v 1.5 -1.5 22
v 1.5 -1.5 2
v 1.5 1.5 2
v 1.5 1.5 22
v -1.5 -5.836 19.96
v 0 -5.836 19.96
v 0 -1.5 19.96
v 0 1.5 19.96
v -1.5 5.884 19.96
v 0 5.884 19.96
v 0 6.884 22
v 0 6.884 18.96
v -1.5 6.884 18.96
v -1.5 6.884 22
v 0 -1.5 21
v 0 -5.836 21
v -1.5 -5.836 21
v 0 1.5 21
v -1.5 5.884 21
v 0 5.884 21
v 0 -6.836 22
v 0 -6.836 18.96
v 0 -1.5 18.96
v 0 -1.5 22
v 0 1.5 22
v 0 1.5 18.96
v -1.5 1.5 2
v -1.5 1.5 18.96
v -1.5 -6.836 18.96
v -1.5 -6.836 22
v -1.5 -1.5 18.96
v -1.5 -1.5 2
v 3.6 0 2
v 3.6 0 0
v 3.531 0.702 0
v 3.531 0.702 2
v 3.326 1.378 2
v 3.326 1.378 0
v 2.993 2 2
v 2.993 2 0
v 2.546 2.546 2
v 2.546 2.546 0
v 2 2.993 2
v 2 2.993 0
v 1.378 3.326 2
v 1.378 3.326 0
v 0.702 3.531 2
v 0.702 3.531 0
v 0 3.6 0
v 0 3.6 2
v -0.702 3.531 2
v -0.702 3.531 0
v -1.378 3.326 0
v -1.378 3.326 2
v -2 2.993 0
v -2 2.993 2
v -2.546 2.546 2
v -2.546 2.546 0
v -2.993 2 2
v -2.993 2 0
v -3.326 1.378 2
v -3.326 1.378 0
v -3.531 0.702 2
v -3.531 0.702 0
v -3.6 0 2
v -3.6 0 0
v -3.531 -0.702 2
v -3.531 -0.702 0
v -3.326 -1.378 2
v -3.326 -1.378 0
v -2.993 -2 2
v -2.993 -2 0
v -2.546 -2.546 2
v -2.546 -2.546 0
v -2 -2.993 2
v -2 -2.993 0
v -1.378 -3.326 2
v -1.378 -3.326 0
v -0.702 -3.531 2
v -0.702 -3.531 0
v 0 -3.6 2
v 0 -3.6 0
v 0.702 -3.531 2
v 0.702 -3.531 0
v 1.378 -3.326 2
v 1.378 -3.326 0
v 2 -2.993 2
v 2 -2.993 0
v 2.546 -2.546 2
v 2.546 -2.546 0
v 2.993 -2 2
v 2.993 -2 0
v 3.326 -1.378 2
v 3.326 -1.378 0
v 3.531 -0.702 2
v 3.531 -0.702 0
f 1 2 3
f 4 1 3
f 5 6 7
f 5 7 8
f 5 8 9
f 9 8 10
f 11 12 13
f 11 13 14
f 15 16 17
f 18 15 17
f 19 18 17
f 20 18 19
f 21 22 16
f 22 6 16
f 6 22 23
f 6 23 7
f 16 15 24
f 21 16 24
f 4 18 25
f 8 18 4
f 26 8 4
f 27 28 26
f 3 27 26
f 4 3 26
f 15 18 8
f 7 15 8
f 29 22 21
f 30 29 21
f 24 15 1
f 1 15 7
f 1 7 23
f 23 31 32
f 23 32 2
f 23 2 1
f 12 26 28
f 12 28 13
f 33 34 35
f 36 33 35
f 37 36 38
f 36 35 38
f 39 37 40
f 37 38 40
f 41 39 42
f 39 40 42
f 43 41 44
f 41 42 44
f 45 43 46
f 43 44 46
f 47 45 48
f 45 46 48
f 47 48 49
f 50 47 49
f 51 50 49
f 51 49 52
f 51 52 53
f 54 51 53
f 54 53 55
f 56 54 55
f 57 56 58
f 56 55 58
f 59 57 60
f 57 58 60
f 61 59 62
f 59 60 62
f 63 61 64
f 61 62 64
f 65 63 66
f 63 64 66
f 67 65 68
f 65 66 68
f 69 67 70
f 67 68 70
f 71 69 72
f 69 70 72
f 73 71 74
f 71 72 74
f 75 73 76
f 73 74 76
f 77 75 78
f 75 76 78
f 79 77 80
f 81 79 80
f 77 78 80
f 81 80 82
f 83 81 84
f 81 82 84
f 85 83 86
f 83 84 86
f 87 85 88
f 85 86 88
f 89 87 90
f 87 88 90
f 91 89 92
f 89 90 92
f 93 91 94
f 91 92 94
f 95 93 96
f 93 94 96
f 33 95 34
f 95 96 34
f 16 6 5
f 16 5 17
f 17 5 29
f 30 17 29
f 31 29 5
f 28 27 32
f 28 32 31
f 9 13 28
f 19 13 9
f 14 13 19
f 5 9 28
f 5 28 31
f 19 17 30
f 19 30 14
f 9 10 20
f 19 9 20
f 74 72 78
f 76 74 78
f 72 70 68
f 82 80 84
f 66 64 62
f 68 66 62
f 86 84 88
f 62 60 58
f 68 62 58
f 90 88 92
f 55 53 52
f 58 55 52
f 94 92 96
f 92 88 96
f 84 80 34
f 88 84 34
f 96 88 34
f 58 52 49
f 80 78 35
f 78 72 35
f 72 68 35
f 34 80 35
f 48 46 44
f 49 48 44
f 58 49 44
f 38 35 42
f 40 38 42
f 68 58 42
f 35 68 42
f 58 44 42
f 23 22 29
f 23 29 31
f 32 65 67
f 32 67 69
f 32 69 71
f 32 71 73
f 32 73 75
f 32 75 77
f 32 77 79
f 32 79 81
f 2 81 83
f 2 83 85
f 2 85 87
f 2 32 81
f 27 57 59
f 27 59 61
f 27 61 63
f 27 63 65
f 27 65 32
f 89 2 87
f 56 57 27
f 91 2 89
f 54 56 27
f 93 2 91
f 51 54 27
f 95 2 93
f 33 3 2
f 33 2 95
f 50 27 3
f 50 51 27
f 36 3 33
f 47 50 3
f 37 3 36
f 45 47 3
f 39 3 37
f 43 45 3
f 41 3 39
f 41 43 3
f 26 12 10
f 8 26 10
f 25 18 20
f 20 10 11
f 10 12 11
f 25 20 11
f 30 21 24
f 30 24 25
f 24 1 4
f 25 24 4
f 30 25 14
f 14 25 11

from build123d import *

# Parameters (mm, degrees)
SKETCH1_R           = 3.6
BOSS_EXTRUDE1_DEPTH = 2
SKETCH2_W           = 3
SKETCH2_H           = 3
BOSS_EXTRUDE2_DEPTH = 20
SKETCH3_W           = 1.5
SKETCH3_H           = 3.039979134
CUT_EXTRUDE1_DEPTH  = 3
SKETCH4_W           = 3.039979134
SKETCH4_H           = 13.71909755
SKETCH4_W_2         = 1.039979134
SKETCH4_H_2         = 11.71909755
BOSS_EXTRUDE3_DEPTH = 1.5


with BuildPart() as part:
    # Sketch1 → Boss-Extrude1 (new body)
    with BuildSketch(Plane.XY):
        Circle(SKETCH1_R)
    extrude(amount=BOSS_EXTRUDE1_DEPTH)

    # Sketch2 → Boss-Extrude2 (add)
    with BuildSketch(Plane.XY.offset(2)):
        Rectangle(SKETCH2_W, SKETCH2_H)
    extrude(amount=BOSS_EXTRUDE2_DEPTH)

    # Sketch3 → Cut-Extrude1 (cut)
    with BuildSketch(Plane(origin=(0, 1.5, 0), x_dir=(1, 0, 0), z_dir=(0, 1, 0))):
        with Locations((-0.75, -20.480010433)):
            Rectangle(SKETCH3_W, SKETCH3_H)
    extrude(amount=-CUT_EXTRUDE1_DEPTH, mode=Mode.SUBTRACT)

    # Sketch4 → Boss-Extrude3 (add)
    with BuildSketch(Plane.ZY):
        with Locations((20.480010433, 0.024038237)):
            Rectangle(SKETCH4_W, SKETCH4_H)
        with Locations((20.480010433, 0.024038237)):
            Rectangle(SKETCH4_W_2, SKETCH4_H_2, mode=Mode.SUBTRACT)
    extrude(amount=BOSS_EXTRUDE3_DEPTH)


solid = part.part
